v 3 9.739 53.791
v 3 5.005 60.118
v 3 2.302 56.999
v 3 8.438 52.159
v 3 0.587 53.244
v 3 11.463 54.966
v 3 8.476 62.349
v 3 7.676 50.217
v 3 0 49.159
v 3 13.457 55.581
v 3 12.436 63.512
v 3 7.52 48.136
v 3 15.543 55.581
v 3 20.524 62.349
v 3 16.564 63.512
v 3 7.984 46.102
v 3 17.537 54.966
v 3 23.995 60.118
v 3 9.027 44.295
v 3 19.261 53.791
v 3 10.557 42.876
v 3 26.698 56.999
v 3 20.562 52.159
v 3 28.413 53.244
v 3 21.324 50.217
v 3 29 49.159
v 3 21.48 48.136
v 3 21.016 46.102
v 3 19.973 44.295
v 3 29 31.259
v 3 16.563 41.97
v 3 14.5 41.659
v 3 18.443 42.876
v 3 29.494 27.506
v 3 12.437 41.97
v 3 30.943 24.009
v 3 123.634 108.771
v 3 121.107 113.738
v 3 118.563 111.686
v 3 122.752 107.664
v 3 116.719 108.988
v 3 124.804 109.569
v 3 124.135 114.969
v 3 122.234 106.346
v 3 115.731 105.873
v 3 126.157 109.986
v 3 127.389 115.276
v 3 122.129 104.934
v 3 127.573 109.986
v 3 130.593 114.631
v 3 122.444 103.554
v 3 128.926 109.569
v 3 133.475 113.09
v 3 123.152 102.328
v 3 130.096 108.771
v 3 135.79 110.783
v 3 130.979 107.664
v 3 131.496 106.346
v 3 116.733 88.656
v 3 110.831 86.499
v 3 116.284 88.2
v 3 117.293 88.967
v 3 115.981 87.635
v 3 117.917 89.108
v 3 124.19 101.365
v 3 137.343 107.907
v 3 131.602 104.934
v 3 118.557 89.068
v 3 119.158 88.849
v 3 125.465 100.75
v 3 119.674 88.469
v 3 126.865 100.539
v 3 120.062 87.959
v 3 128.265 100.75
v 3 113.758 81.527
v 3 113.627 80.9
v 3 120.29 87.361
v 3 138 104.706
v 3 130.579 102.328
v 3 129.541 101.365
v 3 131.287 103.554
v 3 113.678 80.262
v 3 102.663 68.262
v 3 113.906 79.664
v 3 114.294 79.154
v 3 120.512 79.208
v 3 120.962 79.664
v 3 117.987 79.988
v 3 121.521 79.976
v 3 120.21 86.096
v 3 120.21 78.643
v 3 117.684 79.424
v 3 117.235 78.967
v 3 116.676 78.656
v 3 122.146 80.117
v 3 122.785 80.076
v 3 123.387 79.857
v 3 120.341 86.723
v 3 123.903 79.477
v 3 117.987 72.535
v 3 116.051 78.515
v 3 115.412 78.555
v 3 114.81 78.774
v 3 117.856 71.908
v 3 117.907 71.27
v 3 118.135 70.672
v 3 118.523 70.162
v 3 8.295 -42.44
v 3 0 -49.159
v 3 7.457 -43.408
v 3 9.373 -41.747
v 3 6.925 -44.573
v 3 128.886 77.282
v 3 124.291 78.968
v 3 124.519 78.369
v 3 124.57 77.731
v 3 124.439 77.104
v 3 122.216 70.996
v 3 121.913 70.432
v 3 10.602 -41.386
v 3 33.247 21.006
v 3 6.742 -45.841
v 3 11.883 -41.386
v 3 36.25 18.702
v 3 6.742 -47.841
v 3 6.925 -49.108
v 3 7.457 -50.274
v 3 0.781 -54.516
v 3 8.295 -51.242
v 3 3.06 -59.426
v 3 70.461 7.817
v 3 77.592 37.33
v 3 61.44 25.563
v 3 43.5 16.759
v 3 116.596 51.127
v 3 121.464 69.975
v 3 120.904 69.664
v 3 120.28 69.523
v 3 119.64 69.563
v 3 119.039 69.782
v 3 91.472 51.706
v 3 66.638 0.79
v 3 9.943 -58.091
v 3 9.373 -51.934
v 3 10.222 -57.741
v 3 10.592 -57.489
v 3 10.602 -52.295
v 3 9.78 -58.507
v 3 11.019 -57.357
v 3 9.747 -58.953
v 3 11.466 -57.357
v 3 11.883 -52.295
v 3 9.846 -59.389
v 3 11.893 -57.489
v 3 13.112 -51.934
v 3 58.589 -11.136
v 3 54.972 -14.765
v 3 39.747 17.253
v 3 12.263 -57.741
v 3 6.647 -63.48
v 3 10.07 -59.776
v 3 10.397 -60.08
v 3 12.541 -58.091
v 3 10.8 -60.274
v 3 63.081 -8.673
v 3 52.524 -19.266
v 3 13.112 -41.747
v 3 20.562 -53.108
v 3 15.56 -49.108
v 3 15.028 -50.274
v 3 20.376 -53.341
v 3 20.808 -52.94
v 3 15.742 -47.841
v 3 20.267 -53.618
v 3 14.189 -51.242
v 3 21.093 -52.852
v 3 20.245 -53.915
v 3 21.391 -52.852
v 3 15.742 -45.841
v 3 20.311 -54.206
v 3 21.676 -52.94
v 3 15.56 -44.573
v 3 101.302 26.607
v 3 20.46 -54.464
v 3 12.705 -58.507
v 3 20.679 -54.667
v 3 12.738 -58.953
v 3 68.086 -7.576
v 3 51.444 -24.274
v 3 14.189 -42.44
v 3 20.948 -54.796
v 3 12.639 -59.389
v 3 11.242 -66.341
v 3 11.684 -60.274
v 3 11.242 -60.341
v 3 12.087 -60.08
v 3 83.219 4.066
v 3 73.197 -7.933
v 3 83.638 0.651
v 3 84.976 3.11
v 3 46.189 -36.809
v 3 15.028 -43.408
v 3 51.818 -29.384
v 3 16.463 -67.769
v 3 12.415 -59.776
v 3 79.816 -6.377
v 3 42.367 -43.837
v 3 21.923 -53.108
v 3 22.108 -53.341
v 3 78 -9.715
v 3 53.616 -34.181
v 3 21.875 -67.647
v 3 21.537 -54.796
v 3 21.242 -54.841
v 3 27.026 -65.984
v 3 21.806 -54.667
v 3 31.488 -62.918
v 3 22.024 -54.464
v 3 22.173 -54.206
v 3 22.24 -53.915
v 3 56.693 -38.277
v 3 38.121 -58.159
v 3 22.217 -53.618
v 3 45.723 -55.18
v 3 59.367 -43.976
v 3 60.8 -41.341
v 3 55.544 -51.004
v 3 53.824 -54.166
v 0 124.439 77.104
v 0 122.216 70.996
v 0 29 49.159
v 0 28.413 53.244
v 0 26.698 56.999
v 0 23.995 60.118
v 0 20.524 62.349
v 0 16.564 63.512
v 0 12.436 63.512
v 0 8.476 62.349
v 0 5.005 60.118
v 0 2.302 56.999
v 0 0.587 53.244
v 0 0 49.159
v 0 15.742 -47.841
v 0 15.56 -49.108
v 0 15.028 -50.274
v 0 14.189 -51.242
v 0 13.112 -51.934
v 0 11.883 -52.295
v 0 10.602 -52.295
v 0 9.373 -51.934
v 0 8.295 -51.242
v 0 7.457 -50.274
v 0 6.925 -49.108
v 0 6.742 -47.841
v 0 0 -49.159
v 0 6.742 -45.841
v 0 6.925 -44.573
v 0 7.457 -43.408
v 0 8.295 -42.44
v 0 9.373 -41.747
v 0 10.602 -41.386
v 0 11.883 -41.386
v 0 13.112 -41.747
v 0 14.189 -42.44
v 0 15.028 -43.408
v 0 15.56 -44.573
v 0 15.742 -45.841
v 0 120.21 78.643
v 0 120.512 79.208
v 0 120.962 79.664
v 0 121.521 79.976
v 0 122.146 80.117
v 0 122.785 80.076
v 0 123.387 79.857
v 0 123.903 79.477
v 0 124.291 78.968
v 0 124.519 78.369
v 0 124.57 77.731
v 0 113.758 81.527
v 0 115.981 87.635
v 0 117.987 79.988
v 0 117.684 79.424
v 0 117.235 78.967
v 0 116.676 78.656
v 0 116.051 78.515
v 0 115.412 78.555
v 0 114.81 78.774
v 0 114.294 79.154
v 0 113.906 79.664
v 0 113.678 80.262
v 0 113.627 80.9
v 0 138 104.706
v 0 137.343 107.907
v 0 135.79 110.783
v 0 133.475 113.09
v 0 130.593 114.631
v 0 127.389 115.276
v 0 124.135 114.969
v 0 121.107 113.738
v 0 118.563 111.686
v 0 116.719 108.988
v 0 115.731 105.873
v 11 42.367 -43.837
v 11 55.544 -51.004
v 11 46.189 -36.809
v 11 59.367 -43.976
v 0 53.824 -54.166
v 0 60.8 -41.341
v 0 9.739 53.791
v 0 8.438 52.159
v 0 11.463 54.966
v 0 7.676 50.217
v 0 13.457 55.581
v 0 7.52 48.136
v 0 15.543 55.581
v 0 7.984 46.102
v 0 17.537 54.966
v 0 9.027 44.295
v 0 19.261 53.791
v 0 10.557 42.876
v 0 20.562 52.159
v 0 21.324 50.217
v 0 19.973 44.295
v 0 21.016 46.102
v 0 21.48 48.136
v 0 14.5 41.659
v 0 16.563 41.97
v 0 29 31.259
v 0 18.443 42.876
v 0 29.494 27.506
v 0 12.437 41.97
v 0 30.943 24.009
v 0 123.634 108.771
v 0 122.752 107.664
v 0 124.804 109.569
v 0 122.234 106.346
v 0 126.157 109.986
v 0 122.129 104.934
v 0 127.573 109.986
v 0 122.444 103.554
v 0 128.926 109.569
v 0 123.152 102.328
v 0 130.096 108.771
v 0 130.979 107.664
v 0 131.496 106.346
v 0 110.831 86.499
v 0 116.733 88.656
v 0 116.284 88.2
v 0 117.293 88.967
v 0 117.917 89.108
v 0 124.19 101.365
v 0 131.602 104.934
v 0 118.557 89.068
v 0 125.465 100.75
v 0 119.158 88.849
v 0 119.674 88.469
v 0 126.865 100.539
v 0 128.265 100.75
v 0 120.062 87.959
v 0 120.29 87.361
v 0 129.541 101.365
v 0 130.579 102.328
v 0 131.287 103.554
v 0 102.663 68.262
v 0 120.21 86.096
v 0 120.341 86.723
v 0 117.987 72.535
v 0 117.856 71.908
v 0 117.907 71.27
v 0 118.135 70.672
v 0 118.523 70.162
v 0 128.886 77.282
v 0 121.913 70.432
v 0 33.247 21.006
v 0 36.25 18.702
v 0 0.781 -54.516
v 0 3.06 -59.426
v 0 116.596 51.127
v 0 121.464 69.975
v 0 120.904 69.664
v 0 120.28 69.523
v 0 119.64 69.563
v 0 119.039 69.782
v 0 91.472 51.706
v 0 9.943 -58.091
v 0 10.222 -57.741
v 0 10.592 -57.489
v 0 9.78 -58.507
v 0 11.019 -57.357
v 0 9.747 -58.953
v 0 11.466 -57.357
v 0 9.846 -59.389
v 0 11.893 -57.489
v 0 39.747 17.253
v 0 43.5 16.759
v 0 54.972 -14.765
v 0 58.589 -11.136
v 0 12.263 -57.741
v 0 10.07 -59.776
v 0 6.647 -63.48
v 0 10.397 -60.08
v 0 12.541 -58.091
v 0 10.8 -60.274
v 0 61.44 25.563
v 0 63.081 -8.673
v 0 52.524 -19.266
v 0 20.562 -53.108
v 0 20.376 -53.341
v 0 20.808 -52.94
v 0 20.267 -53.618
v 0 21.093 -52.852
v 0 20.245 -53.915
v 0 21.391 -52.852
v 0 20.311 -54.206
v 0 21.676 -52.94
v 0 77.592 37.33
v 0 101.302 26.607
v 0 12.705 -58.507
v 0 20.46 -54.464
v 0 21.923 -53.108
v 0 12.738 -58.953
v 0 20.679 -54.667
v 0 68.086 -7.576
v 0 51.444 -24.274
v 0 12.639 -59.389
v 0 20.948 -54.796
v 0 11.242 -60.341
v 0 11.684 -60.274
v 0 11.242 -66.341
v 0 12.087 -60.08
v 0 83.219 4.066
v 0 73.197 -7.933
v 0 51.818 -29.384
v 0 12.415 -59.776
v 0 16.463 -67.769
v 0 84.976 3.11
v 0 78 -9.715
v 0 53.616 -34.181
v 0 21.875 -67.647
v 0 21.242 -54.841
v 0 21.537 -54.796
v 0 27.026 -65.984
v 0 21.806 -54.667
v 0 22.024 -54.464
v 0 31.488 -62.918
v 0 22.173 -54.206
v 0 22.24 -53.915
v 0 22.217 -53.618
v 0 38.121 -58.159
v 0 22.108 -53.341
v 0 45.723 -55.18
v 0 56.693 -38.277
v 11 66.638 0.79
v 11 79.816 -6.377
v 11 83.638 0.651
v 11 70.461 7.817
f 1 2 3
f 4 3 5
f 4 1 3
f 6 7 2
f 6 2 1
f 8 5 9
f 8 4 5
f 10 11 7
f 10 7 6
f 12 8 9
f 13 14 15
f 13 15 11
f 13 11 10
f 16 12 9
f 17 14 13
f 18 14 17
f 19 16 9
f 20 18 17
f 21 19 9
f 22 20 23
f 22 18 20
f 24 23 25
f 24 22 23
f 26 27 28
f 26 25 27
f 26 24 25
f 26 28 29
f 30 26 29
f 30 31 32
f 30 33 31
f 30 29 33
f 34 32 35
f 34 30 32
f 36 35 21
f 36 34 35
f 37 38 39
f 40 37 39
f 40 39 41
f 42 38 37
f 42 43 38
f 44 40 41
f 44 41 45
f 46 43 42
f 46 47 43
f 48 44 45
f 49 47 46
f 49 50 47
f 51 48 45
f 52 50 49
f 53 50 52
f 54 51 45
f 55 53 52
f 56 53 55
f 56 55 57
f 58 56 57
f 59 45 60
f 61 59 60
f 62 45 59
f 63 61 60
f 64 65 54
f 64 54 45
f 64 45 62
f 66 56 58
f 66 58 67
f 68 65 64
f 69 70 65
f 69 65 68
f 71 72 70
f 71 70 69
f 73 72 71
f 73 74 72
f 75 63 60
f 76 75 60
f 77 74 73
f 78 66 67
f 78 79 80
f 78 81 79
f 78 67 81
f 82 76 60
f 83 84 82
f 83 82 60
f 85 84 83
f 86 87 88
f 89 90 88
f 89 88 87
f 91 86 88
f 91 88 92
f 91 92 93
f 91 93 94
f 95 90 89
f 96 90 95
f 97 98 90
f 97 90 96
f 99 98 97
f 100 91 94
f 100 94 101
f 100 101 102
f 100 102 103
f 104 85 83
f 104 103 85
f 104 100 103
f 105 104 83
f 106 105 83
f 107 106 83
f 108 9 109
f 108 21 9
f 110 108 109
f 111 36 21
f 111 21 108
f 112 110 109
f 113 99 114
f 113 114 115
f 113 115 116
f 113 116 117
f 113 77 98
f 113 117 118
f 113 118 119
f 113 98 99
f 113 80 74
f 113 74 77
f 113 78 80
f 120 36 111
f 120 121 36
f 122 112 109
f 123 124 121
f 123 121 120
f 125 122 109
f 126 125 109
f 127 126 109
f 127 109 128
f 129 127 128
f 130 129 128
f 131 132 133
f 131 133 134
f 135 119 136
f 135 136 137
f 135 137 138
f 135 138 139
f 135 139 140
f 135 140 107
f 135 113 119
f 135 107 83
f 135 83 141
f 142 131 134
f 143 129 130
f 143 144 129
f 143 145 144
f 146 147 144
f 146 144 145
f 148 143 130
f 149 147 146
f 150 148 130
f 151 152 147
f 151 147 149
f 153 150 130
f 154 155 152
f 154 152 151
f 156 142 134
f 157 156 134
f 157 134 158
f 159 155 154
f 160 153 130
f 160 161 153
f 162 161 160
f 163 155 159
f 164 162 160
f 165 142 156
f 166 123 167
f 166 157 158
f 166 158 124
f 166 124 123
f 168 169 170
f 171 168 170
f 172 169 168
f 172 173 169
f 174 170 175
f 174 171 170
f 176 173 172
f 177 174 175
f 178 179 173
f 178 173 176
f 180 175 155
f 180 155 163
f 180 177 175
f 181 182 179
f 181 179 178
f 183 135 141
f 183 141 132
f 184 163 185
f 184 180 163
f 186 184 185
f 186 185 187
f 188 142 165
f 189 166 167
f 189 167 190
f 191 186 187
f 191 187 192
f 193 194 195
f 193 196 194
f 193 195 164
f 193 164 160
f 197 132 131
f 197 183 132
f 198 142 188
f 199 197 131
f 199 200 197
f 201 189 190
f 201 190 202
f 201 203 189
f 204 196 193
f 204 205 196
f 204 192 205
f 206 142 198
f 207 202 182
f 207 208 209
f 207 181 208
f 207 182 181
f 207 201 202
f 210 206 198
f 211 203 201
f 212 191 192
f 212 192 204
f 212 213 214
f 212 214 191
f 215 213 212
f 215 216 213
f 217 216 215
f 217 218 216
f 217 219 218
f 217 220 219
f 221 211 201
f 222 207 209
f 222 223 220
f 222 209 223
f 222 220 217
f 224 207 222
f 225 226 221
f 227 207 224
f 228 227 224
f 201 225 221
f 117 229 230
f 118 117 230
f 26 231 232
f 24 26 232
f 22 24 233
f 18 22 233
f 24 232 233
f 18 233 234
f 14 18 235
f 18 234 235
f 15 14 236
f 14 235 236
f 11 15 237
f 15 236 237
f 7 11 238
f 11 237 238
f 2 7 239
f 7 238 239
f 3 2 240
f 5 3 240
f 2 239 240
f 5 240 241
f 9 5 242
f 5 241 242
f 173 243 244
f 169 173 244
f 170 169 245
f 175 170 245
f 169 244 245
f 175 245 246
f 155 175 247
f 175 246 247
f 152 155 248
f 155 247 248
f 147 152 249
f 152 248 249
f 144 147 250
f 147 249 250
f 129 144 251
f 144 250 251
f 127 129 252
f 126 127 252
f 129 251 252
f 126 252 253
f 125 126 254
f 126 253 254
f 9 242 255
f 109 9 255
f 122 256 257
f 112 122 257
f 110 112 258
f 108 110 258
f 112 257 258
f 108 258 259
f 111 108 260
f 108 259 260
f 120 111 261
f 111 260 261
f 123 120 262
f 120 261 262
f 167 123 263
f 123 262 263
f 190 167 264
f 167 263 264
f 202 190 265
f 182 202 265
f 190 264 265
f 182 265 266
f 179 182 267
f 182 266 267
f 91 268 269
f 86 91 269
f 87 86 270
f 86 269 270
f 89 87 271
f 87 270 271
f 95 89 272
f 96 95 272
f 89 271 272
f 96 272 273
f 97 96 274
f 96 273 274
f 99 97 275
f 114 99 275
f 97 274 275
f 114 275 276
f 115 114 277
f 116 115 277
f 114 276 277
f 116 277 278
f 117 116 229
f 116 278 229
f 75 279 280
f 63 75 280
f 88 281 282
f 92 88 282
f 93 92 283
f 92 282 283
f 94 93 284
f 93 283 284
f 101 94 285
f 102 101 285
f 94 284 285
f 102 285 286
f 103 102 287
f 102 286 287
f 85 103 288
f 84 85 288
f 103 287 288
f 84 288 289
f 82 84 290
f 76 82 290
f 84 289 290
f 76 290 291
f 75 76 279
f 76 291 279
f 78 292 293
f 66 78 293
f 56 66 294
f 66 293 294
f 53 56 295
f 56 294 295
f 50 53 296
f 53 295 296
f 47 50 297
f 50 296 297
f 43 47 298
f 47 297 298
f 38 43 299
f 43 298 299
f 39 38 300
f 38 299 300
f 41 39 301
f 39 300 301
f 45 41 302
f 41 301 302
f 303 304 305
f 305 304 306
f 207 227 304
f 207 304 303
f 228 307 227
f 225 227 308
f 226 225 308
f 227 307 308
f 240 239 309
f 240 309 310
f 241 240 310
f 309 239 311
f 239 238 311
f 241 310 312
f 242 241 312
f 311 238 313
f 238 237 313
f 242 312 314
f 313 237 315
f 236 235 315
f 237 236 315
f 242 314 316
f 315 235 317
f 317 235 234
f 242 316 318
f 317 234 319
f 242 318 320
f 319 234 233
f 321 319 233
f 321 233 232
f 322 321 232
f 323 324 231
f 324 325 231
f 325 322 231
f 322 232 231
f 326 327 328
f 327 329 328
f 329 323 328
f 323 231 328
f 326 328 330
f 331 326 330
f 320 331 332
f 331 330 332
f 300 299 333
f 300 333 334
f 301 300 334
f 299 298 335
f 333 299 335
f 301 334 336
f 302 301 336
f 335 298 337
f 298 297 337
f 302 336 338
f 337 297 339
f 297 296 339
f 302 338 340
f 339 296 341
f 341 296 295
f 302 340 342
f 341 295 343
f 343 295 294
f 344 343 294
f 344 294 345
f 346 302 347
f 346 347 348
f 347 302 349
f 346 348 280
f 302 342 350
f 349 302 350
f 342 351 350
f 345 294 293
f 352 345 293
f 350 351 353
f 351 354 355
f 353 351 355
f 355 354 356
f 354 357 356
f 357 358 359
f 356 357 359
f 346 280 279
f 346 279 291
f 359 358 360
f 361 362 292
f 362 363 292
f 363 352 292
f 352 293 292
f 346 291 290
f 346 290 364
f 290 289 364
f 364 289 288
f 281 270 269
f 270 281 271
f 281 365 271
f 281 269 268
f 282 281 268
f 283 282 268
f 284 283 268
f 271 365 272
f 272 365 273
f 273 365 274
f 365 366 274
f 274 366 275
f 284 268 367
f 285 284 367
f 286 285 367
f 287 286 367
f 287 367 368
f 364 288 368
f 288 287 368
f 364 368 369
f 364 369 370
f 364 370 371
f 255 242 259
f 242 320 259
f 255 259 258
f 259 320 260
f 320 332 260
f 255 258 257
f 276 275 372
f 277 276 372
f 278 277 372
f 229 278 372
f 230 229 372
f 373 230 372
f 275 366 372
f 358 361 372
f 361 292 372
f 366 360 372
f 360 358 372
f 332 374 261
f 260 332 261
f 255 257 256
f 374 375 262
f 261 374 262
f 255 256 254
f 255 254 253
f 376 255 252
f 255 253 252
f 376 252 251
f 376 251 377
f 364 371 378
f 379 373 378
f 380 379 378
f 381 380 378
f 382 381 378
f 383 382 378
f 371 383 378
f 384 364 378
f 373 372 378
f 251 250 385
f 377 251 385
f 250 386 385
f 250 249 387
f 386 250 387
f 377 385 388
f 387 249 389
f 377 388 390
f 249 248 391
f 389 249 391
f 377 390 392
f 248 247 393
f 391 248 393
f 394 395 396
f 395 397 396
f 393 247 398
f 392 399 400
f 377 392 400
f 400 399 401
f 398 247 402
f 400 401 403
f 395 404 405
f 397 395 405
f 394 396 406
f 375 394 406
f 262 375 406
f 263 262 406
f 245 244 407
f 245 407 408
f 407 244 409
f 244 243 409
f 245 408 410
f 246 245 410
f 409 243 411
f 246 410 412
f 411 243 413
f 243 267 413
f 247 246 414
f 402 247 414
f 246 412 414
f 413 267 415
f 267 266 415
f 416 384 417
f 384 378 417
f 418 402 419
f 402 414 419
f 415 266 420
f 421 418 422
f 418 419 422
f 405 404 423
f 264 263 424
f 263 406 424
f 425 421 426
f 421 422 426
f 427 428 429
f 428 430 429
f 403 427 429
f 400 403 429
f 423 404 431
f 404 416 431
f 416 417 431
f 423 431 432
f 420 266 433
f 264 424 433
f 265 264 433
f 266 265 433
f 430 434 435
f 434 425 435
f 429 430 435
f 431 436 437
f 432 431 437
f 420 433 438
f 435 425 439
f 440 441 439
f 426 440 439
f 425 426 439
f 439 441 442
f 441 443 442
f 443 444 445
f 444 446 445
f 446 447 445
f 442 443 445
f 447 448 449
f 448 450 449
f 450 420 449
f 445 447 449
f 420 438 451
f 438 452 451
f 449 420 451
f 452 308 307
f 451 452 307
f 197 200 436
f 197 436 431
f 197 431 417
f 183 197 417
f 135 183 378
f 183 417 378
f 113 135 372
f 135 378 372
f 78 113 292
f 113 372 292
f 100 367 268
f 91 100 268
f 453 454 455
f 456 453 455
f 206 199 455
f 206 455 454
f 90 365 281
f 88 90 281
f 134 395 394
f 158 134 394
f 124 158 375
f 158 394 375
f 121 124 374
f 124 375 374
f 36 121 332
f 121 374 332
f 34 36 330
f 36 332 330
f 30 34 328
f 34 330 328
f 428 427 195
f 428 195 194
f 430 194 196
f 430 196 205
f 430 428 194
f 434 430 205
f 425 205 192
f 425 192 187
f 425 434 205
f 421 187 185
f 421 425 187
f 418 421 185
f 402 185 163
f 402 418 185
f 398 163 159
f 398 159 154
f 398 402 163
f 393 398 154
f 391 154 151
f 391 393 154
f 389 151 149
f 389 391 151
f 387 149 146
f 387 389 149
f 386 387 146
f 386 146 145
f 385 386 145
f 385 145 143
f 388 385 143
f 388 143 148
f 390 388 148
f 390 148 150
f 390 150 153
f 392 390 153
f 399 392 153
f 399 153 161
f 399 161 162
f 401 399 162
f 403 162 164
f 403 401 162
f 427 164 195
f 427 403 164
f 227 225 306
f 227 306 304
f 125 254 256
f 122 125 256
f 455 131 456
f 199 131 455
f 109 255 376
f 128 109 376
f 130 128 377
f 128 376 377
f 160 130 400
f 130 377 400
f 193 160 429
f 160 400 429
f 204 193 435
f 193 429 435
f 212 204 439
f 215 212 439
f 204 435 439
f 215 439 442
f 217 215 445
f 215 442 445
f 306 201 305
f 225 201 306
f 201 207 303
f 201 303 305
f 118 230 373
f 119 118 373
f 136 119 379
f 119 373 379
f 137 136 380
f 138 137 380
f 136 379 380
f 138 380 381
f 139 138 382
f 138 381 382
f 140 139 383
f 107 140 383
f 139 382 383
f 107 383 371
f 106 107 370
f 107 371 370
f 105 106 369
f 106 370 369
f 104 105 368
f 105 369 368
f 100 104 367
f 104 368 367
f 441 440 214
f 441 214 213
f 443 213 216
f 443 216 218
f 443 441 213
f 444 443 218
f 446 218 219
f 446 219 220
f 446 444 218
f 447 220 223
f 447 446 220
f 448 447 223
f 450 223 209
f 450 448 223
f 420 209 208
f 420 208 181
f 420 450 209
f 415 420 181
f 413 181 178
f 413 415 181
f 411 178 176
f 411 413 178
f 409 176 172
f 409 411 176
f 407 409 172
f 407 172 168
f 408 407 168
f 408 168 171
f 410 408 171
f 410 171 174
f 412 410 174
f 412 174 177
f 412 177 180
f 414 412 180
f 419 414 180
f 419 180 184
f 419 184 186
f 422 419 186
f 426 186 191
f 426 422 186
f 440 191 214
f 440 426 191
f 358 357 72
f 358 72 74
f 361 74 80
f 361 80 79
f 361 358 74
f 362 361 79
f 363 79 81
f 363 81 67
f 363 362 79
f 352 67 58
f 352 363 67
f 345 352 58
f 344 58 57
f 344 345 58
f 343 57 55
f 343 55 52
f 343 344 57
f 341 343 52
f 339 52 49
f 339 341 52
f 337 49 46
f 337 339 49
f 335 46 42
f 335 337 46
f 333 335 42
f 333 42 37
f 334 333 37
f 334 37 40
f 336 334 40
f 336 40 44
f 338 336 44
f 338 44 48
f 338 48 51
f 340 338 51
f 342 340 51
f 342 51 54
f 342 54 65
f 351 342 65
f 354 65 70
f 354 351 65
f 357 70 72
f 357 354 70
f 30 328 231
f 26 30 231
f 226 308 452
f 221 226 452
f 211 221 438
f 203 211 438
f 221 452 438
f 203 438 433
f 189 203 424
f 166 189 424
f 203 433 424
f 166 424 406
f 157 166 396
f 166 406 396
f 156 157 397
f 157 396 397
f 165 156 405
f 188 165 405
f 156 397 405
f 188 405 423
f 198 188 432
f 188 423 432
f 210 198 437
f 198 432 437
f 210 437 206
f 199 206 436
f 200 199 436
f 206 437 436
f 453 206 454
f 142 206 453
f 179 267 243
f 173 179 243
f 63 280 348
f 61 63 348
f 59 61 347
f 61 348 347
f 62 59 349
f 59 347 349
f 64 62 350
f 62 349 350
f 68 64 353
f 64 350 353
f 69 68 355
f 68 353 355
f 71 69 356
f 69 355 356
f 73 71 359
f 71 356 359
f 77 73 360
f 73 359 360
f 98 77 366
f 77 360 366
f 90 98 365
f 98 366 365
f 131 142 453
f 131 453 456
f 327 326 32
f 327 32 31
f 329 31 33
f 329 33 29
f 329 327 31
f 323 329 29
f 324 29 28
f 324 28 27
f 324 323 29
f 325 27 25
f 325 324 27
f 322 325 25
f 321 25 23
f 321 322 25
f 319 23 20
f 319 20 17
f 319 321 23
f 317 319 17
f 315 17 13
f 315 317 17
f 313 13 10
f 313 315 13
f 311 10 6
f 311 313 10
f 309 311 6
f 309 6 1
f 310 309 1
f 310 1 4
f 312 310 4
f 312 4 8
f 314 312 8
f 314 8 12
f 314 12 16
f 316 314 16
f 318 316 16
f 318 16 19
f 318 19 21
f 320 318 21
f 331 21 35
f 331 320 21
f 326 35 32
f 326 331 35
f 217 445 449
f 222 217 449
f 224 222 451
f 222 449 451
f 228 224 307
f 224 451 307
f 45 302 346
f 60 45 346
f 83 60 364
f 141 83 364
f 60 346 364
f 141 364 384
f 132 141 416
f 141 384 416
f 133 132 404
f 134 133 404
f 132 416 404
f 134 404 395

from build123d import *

# Parameters (mm, degrees)
SKETCH1_R           = 1.5
SKETCH1_R_2         = 1
SKETCH1_R_3         = 7
SKETCH1_R_4         = 4.75
BOSS_EXTRUDE1_DEPTH = 3
BOSS_EXTRUDE2_DEPTH = 8


with BuildPart() as part:
    # Sketch1 → Boss-Extrude1 (new body)
    with BuildSketch(Plane(origin=(0, 0, 0), x_dir=(0, 0, -1), z_dir=(1, 0, 0))):
        with BuildLine():
            Line((-49.159345461, 0), (49.159345461, 0))
            ThreePointArc((49.159345461, 0), (66.340654539, 11.242329364), (62.91845049, 31.487720707))
            ThreePointArc((62.91845049, 31.487720707), (56.432557087, 41.829379484), (54.166473214, 53.824444444))
            Line((54.166473214, 53.824444444), (41.340654539, 60.8))
            ThreePointArc((41.340654539, 60.8), (16.928001378, 53.587346839), (9.715348216, 78))
            Line((9.715348216, 78), (-3.110470459, 84.975555556))
            Line((-3.110470459, 84.975555556), (-4.066026015, 83.218594093))
            ThreePointArc((-4.066026015, 83.218594093), (-51.126972403, 116.596460909), (-104.705915866, 138))
            ThreePointArc((-104.705915866, 138), (-115.275757126, 127.38864025), (-105.87300769, 115.730561375))
            ThreePointArc((-105.87300769, 115.730561375), (-51.706077225, 91.471635272), (-16.759345461, 43.5))
            ThreePointArc((-16.759345461, 43.5), (-21.006297134, 33.246951673), (-31.259345461, 29))
            Line((-31.259345461, 29), (-49.159345461, 29))
            ThreePointArc((-49.159345461, 29), (-63.659345461, 14.5), (-49.159345461, 0))
        make_face()
        with Locations((58.840654539, 11.242329364)):
            Circle(SKETCH1_R, mode=Mode.SUBTRACT)
        with Locations((53.840654539, 21.242329364)):
            Circle(SKETCH1_R_2, mode=Mode.SUBTRACT)
        with Locations((-48.659345461, 14.5)):
            Circle(SKETCH1_R_3, mode=Mode.SUBTRACT)
        with Locations((-105.289461778, 126.865280687)):
            Circle(SKETCH1_R_4, mode=Mode.SUBTRACT)
        with BuildLine():
            Line((45.840654539, 15.742329364), (47.840654539, 15.742329364))
            ThreePointArc((47.840654539, 15.742329364), (52.340654539, 11.242329364), (47.840654539, 6.742329364))
            Line((47.840654539, 6.742329364), (45.840654539, 6.742329364))
            ThreePointArc((45.840654539, 6.742329364), (41.340654539, 11.242329364), (45.840654539, 15.742329364))
        make_face(mode=Mode.SUBTRACT)
        with BuildLine():
            Line((-86.096000708, 120.210043762), (-79.987998673, 117.98691283))
            ThreePointArc((-79.987998673, 117.98691283), (-78.643235599, 115.103059111), (-81.527089318, 113.758296037))
            Line((-81.527089318, 113.758296037), (-87.635091353, 115.981426968))
            ThreePointArc((-87.635091353, 115.981426968), (-88.979854428, 118.865280687), (-86.096000708, 120.210043762))
        make_face(mode=Mode.SUBTRACT)
        with BuildLine():
            Line((-77.104144954, 124.438660555), (-70.996142919, 122.215529624))
            ThreePointArc((-70.996142919, 122.215529624), (-69.651379845, 119.331675904), (-72.535233564, 117.98691283))
            Line((-72.535233564, 117.98691283), (-78.643235599, 120.210043762))
            ThreePointArc((-78.643235599, 120.210043762), (-79.987998673, 123.093897481), (-77.104144954, 124.438660555))
        make_face(mode=Mode.SUBTRACT)
    extrude(amount=BOSS_EXTRUDE1_DEPTH)

    # Sketch2 → Boss-Extrude2 (add)
    with BuildSketch(Plane(origin=(3, 0, 0), x_dir=(0, 0, -1), z_dir=(1, 0, 0))):
        Polygon((43.976096732, 59.366666667), (51.003942582, 55.544444444), (43.837275915, 42.367233477), (36.809430066, 46.189455699), align=None)
        Polygon((-0.650724412, 83.637777778), (6.377121438, 79.815555556), (-0.789545229, 66.638344588), (-7.817391078, 70.46056681), align=None)
    extrude(amount=BOSS_EXTRUDE2_DEPTH)


solid = part.part
